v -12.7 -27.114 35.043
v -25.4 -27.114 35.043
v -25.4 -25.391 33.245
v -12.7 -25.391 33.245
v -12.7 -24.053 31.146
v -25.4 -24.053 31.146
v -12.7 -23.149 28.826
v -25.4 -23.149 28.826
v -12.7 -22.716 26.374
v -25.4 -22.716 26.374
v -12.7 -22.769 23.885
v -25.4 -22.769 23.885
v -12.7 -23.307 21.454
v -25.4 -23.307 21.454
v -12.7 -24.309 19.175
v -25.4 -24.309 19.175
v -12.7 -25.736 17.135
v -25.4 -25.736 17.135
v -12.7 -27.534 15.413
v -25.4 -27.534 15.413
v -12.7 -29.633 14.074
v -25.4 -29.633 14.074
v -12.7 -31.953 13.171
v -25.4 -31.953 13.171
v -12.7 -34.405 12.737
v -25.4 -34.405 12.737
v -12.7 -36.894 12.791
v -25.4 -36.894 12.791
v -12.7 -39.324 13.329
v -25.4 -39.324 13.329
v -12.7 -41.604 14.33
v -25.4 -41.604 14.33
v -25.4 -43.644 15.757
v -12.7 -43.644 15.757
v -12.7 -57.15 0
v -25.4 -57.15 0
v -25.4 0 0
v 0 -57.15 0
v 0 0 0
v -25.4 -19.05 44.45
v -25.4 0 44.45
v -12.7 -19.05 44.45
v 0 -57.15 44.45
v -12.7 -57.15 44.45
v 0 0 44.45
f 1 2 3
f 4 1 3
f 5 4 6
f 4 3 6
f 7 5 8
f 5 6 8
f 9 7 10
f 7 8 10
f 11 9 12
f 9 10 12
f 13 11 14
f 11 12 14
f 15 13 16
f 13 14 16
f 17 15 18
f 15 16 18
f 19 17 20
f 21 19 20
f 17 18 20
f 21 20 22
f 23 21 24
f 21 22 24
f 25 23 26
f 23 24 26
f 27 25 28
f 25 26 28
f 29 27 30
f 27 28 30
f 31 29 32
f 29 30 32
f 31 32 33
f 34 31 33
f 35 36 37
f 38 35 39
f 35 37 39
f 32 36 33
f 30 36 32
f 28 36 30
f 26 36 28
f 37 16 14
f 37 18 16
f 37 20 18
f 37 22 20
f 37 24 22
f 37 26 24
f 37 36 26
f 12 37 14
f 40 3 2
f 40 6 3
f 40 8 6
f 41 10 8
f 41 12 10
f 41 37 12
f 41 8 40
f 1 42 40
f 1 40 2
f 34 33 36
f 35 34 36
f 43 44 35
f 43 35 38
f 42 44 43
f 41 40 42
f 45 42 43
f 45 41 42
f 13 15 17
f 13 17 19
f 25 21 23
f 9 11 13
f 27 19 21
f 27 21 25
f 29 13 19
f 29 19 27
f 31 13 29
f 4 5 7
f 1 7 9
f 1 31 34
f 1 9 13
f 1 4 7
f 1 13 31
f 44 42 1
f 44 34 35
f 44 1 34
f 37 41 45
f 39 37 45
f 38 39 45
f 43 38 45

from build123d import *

# Parameters (mm, degrees)
F0_W     = 25.4
F0_H     = 44.45
F1_DEPTH = 57.15
F3_DEPTH = 12.7
F4_R     = 12.7
F5_DEPTH = 12.7


with BuildPart() as f1:
    # F0 (on Front) → F1 (new body)
    with BuildSketch(Plane.XZ):
        with Locations((-12.7, 22.225)):
            Rectangle(F0_W, F0_H)
    extrude(amount=F1_DEPTH)

    # F2 (on face) → F3 (cut)
    with BuildSketch(Plane(origin=(-25.4, 0, 0), x_dir=(0, -1, 0), z_dir=(-1, 0, 0))):
        Polygon((57.15, 44.45), (19.05, 44.45), (57.15, 0), align=None)
    extrude(amount=-F3_DEPTH, mode=Mode.SUBTRACT)

    # F4 (on face) → F5 (cut)
    with BuildSketch(Plane(origin=(-25.4, 0, 0), x_dir=(0, -1, 0), z_dir=(-1, 0, 0))):
        with Locations((35.378571, 25.4)):
            Circle(F4_R)
    extrude(amount=-F5_DEPTH, mode=Mode.SUBTRACT)


solid = f1.part
